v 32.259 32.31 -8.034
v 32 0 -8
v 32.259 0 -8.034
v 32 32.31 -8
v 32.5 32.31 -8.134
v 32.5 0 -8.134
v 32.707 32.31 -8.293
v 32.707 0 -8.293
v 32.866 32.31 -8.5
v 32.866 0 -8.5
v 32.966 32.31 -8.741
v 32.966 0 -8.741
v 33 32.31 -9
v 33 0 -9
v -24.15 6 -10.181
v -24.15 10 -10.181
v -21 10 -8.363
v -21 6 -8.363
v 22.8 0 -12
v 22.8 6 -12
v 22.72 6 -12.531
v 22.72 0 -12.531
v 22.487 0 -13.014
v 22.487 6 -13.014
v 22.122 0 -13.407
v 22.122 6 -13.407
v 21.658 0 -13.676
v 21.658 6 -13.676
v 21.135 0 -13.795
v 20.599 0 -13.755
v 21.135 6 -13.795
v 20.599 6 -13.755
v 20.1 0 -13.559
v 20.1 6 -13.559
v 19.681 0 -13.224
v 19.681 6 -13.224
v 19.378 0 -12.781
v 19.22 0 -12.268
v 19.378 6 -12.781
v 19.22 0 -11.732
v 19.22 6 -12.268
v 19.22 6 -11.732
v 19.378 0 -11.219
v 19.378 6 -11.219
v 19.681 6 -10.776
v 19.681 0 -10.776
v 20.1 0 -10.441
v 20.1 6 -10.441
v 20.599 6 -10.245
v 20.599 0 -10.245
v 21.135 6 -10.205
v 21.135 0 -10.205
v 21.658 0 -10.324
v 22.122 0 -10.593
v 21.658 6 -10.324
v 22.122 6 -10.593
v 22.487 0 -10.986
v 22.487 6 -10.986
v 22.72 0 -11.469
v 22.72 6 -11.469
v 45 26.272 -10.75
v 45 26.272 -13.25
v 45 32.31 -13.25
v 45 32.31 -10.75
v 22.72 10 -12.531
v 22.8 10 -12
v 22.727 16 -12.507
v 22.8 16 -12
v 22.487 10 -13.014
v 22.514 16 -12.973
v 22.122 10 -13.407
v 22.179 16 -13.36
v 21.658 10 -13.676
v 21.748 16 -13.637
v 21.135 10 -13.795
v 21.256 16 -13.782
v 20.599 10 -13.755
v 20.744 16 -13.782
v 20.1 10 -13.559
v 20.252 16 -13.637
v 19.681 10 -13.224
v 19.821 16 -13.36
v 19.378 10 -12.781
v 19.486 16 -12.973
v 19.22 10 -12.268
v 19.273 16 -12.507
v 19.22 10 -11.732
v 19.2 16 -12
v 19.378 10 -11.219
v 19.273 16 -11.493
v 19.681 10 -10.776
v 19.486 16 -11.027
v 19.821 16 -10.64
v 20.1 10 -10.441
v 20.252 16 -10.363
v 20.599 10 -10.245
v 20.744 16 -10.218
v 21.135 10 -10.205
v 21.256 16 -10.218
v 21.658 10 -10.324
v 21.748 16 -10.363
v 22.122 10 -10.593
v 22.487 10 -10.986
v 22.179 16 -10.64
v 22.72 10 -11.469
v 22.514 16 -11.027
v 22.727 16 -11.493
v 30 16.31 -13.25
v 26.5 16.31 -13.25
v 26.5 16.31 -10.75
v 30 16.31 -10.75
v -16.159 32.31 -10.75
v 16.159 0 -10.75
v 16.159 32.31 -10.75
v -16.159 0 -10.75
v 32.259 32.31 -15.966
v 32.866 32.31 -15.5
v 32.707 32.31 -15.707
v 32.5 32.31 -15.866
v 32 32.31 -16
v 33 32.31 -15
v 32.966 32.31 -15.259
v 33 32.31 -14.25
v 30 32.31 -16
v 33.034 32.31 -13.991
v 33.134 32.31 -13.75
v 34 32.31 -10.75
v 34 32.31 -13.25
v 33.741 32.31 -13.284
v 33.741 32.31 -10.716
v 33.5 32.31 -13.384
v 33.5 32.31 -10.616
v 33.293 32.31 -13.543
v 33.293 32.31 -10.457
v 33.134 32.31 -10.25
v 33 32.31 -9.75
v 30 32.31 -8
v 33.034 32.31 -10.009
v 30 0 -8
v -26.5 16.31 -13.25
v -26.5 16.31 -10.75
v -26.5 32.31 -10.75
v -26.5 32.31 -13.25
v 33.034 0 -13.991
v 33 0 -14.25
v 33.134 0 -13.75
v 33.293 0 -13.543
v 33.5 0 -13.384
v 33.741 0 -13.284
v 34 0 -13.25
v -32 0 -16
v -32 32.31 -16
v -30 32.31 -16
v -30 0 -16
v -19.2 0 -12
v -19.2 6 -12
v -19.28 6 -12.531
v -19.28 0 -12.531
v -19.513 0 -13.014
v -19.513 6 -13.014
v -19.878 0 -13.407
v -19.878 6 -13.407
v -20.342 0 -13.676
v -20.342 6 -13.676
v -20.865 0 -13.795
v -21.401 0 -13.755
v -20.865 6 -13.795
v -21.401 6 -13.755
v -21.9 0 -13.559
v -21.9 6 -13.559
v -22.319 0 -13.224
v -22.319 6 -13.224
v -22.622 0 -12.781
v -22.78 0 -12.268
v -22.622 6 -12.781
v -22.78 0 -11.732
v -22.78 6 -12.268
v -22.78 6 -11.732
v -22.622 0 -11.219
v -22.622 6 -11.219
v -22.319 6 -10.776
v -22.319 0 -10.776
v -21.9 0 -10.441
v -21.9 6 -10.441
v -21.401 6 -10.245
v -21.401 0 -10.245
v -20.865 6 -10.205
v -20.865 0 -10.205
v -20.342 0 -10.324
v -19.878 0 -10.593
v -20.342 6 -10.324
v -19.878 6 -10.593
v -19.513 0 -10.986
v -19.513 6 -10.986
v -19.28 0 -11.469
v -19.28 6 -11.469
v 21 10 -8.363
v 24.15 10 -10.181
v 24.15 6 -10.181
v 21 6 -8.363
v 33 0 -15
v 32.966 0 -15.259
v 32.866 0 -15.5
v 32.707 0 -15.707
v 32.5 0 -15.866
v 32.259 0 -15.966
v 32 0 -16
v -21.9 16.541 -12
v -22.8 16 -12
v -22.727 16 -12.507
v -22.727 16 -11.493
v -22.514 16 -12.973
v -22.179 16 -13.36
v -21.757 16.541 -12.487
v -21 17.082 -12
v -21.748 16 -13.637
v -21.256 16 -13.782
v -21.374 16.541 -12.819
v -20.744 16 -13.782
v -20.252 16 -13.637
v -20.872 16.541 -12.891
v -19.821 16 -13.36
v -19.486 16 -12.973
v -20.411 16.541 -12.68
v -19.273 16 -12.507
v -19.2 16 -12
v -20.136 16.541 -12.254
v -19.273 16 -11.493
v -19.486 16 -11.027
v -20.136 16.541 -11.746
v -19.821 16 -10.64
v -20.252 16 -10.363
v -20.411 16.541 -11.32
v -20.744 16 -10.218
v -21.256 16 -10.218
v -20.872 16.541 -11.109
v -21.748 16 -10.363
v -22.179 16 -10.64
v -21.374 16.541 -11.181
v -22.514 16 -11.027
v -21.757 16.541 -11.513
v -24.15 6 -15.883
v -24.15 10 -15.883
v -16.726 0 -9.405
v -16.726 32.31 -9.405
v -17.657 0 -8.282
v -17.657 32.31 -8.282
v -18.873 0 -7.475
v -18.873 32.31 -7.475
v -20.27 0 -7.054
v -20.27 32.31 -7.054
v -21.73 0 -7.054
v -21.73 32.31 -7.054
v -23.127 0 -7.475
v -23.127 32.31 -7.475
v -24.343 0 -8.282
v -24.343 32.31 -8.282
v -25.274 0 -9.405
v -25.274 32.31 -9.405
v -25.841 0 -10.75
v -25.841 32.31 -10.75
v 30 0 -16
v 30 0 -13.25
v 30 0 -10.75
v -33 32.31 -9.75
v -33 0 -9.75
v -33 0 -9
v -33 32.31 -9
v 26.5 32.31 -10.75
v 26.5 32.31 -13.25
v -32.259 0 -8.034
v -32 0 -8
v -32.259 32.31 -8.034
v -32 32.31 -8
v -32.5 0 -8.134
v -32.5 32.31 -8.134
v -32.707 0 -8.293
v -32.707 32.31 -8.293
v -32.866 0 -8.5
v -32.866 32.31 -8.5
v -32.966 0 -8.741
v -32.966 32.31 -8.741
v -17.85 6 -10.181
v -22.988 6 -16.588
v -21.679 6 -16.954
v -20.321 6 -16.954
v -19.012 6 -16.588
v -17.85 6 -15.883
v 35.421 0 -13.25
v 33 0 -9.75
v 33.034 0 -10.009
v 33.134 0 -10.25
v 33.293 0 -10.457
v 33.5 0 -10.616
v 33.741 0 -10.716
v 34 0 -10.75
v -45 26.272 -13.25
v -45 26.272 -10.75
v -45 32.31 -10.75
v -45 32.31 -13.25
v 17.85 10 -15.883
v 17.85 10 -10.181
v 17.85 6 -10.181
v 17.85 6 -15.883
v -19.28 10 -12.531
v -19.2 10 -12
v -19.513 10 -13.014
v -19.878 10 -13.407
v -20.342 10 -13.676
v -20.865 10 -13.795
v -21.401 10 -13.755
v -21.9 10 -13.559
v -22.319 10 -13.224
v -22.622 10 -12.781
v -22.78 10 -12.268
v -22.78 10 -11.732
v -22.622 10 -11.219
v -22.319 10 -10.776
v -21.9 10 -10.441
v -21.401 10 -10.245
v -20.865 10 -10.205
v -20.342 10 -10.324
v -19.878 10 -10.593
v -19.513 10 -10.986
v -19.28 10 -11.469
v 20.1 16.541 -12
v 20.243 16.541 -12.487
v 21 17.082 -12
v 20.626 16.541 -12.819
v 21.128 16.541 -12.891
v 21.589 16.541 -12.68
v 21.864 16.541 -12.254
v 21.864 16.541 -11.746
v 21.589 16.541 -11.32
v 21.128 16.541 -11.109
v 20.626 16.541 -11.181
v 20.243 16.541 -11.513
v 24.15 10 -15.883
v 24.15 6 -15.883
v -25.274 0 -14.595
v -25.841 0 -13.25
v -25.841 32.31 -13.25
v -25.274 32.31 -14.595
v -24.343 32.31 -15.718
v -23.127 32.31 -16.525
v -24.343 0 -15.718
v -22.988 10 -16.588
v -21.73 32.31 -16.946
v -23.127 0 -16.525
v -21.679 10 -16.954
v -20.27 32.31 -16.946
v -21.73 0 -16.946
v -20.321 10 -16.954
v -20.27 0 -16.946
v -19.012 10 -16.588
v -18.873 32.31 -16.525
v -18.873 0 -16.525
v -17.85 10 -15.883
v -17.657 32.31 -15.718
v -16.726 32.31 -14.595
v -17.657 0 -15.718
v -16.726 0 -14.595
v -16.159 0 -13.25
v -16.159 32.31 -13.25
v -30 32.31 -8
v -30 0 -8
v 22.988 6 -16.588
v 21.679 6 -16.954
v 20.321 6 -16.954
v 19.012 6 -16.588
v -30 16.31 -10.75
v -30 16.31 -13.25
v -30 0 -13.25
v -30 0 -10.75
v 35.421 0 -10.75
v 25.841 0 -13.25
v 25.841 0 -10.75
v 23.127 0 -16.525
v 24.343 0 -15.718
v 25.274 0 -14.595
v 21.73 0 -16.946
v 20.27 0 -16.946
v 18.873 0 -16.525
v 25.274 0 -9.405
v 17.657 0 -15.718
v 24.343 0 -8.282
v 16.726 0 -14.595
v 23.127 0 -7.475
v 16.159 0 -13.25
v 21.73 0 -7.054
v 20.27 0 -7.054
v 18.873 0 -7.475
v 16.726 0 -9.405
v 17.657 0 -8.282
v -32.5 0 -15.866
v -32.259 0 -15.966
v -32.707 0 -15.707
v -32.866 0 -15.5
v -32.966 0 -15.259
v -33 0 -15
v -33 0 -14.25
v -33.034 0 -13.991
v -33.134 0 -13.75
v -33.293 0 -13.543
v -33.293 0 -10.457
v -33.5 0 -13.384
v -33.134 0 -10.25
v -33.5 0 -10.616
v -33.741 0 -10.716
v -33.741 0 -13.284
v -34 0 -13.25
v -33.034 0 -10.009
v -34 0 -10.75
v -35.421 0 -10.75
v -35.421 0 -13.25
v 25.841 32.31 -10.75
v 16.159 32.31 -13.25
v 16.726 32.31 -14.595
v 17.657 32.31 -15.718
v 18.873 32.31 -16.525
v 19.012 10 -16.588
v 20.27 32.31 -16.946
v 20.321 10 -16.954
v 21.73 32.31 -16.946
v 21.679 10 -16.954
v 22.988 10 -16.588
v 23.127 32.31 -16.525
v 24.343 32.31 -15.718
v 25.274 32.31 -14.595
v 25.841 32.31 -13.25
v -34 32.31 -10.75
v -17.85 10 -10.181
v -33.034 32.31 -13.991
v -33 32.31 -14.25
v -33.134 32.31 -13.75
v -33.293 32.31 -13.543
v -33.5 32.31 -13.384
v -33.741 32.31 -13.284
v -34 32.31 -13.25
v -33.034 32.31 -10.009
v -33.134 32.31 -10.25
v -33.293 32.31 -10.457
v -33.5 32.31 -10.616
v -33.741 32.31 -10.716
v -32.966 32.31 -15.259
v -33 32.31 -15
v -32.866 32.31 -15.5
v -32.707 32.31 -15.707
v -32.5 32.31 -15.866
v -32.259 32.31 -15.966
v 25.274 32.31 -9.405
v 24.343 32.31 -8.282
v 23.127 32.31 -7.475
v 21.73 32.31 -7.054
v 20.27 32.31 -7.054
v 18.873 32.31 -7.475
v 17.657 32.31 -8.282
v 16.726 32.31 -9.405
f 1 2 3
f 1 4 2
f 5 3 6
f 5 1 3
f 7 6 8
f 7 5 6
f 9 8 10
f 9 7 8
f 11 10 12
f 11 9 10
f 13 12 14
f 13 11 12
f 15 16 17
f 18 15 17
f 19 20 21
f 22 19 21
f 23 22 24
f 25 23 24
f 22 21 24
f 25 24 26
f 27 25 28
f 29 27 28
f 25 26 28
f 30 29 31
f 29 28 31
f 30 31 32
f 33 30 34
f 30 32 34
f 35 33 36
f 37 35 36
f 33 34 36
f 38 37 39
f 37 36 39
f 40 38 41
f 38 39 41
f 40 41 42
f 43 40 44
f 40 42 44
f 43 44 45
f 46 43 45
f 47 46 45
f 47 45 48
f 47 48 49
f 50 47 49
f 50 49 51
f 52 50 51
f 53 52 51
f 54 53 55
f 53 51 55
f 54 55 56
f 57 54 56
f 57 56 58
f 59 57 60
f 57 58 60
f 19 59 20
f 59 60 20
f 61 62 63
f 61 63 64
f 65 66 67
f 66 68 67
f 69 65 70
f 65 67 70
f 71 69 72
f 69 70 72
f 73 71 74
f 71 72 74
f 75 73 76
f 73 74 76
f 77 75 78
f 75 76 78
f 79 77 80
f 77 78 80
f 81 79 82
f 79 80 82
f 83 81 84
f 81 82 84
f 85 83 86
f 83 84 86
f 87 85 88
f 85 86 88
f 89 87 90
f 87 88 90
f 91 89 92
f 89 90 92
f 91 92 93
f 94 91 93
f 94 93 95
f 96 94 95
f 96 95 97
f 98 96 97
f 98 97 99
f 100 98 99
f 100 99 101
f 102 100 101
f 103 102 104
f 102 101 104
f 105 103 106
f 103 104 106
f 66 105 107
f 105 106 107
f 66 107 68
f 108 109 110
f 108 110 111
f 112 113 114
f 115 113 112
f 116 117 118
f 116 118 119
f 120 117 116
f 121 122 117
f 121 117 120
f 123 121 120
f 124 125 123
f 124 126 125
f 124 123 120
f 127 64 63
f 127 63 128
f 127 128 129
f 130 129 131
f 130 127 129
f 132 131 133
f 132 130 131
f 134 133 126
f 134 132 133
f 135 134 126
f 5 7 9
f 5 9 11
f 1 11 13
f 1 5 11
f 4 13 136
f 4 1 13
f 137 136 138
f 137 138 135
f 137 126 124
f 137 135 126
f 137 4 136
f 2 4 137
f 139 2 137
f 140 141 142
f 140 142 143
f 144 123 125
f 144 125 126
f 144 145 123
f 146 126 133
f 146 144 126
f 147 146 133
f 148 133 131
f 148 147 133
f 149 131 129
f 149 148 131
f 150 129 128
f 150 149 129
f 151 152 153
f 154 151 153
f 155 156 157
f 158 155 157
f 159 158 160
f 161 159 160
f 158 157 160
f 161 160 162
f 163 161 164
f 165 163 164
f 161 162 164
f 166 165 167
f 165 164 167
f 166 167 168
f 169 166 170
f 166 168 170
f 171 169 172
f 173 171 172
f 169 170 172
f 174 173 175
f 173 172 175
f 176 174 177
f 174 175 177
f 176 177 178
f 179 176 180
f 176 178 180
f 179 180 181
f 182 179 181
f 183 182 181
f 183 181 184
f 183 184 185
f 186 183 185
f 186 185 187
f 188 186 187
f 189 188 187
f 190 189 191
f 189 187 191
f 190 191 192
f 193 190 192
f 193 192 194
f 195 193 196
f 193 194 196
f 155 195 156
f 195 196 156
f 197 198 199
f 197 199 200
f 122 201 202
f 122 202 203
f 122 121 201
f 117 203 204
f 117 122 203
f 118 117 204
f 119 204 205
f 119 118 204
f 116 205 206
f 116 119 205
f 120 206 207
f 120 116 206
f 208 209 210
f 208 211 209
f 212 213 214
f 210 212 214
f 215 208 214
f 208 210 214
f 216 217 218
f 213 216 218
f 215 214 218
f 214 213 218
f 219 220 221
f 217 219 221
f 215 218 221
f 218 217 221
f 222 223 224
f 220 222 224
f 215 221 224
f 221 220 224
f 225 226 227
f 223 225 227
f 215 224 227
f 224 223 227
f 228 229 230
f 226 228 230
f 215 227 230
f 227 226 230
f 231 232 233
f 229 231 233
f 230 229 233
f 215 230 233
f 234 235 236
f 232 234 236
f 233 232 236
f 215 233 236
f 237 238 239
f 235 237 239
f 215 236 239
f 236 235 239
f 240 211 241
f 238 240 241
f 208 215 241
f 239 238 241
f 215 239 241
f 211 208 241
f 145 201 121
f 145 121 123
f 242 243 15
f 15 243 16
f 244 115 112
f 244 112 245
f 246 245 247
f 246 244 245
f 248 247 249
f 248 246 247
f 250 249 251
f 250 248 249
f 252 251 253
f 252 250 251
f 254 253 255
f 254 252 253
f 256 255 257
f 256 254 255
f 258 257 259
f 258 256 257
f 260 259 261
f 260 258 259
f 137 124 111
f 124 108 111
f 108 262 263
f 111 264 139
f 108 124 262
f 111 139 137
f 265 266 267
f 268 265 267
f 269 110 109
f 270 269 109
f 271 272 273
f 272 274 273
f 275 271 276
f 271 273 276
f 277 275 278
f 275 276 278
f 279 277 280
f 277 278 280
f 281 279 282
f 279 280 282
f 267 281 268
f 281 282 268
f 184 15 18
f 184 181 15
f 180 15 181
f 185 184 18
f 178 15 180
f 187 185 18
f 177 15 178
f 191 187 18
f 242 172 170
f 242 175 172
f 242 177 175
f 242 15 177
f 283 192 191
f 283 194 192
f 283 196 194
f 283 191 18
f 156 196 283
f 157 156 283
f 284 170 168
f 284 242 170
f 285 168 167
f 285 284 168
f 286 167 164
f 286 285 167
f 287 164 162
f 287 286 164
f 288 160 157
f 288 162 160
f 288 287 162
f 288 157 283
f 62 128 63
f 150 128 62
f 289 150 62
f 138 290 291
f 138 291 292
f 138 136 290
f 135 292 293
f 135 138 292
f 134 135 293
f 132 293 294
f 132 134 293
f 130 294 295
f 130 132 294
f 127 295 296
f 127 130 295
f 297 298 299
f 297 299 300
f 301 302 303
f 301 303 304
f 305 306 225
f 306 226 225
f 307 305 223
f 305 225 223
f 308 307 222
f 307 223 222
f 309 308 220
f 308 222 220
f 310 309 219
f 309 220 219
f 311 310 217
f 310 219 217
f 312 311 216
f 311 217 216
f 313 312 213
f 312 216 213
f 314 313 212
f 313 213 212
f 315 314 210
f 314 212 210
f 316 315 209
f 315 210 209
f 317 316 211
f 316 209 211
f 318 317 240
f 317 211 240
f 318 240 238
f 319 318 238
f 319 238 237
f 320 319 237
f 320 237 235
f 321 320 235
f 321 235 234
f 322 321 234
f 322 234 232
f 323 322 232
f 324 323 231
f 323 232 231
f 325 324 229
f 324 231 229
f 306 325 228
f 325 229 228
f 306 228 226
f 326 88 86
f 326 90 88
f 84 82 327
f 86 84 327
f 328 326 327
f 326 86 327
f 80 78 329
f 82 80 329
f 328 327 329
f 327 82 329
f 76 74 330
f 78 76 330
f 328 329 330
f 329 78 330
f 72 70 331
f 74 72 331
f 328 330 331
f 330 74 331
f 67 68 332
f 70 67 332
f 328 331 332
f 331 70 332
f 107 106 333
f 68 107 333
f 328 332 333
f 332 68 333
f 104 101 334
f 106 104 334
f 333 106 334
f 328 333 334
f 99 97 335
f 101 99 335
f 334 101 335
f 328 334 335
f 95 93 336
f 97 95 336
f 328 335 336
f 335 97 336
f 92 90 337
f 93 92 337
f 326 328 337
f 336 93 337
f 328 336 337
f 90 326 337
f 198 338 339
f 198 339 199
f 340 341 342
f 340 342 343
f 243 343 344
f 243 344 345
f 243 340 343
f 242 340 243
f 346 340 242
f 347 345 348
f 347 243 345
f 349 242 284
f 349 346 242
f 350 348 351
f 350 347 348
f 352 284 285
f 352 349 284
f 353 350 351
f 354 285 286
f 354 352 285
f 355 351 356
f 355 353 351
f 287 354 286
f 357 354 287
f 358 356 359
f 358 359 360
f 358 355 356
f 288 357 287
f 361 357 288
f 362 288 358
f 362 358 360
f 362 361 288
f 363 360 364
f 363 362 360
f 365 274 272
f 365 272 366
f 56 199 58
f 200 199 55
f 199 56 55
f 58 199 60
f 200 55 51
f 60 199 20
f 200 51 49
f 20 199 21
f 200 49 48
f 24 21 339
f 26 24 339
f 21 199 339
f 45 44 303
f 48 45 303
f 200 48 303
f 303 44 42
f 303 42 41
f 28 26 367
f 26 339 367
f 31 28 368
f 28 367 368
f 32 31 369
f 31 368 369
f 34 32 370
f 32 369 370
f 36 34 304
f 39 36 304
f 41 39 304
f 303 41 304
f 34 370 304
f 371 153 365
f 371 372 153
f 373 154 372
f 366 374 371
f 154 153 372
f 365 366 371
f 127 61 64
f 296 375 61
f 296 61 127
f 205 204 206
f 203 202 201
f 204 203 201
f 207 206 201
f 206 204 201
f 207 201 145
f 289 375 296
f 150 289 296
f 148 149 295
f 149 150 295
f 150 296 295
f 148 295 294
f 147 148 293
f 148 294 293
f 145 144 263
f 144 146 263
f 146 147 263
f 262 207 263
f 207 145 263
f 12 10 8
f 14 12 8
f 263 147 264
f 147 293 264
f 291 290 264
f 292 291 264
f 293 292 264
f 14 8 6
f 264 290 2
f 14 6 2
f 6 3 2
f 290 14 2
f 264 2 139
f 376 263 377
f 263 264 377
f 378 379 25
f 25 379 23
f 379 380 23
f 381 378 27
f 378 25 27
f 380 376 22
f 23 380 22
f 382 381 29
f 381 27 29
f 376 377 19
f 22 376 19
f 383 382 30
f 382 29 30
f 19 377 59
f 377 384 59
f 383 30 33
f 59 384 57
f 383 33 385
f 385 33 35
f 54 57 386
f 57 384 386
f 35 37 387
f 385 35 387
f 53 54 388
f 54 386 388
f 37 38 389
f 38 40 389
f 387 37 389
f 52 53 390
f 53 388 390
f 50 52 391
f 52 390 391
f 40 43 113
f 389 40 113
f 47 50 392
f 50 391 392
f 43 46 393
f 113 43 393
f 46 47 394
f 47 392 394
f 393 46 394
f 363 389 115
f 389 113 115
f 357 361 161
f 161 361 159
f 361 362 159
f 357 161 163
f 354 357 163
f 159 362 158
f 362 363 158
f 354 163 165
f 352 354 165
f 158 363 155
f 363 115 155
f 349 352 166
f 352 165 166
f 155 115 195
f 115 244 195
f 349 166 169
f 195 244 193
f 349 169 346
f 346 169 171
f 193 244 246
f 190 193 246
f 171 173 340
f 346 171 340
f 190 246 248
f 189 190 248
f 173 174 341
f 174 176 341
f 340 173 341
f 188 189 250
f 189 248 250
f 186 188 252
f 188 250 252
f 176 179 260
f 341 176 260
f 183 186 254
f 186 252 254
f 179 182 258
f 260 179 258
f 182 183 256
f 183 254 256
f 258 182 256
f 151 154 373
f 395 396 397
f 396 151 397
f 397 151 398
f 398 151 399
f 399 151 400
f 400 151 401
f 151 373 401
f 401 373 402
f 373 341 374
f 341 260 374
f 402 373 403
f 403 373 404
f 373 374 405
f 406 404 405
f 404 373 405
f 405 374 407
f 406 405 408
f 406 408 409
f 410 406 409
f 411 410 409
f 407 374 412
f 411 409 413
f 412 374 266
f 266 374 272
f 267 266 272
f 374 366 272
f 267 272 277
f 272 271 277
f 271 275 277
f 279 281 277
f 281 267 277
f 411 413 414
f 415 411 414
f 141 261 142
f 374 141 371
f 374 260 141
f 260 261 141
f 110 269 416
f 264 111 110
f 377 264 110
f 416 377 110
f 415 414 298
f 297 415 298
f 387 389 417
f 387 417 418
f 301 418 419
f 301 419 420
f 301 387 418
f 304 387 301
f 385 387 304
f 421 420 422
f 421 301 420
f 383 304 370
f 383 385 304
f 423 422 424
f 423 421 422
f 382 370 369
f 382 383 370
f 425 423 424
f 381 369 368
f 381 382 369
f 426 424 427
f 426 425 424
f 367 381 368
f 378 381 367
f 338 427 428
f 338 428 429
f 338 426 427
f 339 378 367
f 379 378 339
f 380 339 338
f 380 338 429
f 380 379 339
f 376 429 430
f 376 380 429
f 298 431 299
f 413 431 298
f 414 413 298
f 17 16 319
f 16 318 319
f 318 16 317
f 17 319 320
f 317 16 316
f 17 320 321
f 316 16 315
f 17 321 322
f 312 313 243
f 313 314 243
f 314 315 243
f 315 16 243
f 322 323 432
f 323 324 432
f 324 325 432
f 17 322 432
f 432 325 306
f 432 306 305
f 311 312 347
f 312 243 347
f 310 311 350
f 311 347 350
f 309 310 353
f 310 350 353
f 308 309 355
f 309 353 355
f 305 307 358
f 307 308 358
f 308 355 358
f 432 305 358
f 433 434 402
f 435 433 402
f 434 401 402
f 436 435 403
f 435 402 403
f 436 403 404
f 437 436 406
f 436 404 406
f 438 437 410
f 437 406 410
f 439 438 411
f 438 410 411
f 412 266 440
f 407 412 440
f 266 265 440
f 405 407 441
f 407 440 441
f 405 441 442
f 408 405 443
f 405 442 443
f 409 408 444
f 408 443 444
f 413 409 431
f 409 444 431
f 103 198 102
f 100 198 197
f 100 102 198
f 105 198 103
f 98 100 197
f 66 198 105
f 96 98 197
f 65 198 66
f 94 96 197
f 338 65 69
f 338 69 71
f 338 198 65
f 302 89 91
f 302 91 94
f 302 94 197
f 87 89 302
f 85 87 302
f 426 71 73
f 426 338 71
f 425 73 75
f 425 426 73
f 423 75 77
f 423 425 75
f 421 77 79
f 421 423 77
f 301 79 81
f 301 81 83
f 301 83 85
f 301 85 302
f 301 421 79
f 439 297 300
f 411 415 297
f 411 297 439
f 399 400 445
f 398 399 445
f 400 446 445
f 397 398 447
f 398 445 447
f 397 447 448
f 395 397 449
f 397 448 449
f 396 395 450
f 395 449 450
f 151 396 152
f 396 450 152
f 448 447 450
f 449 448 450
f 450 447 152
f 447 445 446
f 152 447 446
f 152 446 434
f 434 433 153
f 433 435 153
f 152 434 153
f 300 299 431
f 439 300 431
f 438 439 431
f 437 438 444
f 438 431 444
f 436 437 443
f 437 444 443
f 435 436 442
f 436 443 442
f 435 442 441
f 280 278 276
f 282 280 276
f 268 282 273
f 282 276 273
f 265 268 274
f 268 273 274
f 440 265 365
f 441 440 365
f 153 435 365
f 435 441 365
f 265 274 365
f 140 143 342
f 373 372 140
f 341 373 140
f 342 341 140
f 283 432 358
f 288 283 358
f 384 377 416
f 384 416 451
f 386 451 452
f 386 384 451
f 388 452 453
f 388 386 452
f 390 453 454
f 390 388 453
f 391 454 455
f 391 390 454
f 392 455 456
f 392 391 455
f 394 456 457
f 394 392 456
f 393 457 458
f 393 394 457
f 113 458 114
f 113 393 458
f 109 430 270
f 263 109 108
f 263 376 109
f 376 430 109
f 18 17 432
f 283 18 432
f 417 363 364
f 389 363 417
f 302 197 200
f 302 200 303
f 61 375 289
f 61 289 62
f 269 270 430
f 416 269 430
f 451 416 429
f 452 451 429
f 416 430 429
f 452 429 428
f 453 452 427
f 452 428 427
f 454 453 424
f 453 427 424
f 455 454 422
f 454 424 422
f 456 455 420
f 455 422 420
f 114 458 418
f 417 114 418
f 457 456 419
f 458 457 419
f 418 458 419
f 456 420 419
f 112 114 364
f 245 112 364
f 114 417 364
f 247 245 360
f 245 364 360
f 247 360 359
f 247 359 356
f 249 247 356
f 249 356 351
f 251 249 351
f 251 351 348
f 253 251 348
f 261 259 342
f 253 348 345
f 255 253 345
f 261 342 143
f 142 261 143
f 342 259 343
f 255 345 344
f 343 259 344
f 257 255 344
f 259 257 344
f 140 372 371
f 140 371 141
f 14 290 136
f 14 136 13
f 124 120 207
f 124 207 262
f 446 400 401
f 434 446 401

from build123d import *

# Parameters (mm, degrees)
BOSS_EXTRUDE1_DEPTH      = 32.31
CUT_EXTRUDE1_DEPTH       = 25
SKETCH3_W                = 3.5
SKETCH3_H                = 16.162716407
CUT_EXTRUDE2_DEPTH       = 16
SKETCH4_W                = 3
SKETCH4_H                = 8
BOSS_EXTRUDE2_DEPTH      = 32.31
FILLET1_R                = 1
FILLET2_R                = 1
M3_CLEARANCE_HOLE1_D     = 3.6
M3_CLEARANCE_HOLE1_DEPTH = 16
M3_CLEARANCE_HOLE1_TIP   = 1.081549114
CUT_EXTRUDE3_DEPTH       = 4


with BuildPart() as part:
    # Sketch1 → Boss-Extrude1 (new body)
    with BuildSketch(Plane(origin=(0, 0, 0), x_dir=(1, 0, 0), z_dir=(0, 1, 0))):
        with BuildLine():
            Line((-45, 13.25), (-25.841229183, 13.25))
            ThreePointArc((-25.841229183, 13.25), (-21, 17), (-16.158770817, 13.25))
            Line((-16.158770817, 13.25), (16.158770817, 13.25))
            ThreePointArc((16.158770817, 13.25), (21, 17), (25.841229183, 13.25))
            Line((25.841229183, 13.25), (45, 13.25))
            Line((45, 13.25), (45, 10.75))
            Line((45, 10.75), (25.841229183, 10.75))
            ThreePointArc((25.841229183, 10.75), (21, 7), (16.158770817, 10.75))
            Line((16.158770817, 10.75), (-16.158770817, 10.75))
            ThreePointArc((-16.158770817, 10.75), (-21, 7), (-25.841229183, 10.75))
            Line((-25.841229183, 10.75), (-45, 10.75))
            Line((-45, 10.75), (-45, 13.25))
        make_face()
    extrude(amount=BOSS_EXTRUDE1_DEPTH)

    # Sketch2 → Cut-Extrude1 (cut)
    with BuildSketch(Plane.XY.offset(-10.75)):
        Polygon((-35.420614591, 0), (-45, 26.272359302), (-58.390365854, 22.525370437), (-53.81468831, -5.500654521), (-35.420614591, -4.763359631), align=None)
        Polygon((53.81468831, -5.500654521), (35.420614591, -4.763359631), (35.420614591, 0), (45, 26.272359302), (58.390365854, 22.525370437), align=None)
    extrude(amount=-CUT_EXTRUDE1_DEPTH, mode=Mode.SUBTRACT)

    # Sketch3 → Cut-Extrude2 (cut)
    with BuildSketch(Plane(origin=(0, 32.31, 0), x_dir=(1, 0, 0), z_dir=(0, 1, 0))):
        with Locations((-28.25, 12.031966157)):
            Rectangle(SKETCH3_W, SKETCH3_H)
        with Locations((28.25, 12.031966157)):
            Rectangle(SKETCH3_W, SKETCH3_H)
    extrude(amount=-CUT_EXTRUDE2_DEPTH, mode=Mode.SUBTRACT)

    # Sketch4 → Boss-Extrude2 (add)
    with BuildSketch(Plane.XZ):
        with Locations((-31.5, -12)):
            Rectangle(SKETCH4_W, SKETCH4_H)
    boss_extrude2 = extrude(amount=-BOSS_EXTRUDE2_DEPTH)

    # Fillet1
    fillet1_edges = [part.edges().sort_by_distance(p)[0] for p in [
        (-33, 16.155, -10.75),
        (-33, 16.155, -8),
        (-33, 16.155, -13.25),
        (-33, 16.155, -16),
    ]]
    fillet(fillet1_edges, radius=FILLET1_R)

    # Mirror1: Boss-Extrude2 across plane
    add(boss_extrude2.mirror(Plane(origin=(0, 0, 0), x_dir=(0, 0, 1), z_dir=(1, 0, 0))))

    # Fillet2
    fillet2_edges = [part.edges().sort_by_distance(p)[0] for p in [
        (33, 16.155, -10.75),
        (33, 16.155, -8),
        (33, 16.155, -13.25),
        (33, 16.155, -16),
    ]]
    fillet(fillet2_edges, radius=FILLET2_R)

    # M3 Clearance Hole1
    with Locations(Plane(origin=(0, 0, 0), x_dir=(-1, 0, 0), z_dir=(0, -1, 0))):
        with Locations((-21, 12), (21, 12)):
            Hole(M3_CLEARANCE_HOLE1_D / 2, depth=M3_CLEARANCE_HOLE1_DEPTH)
            with Locations((0, 0, -(M3_CLEARANCE_HOLE1_DEPTH + M3_CLEARANCE_HOLE1_TIP / 2))):  # 118° drill point
                Cone(0, M3_CLEARANCE_HOLE1_D / 2, M3_CLEARANCE_HOLE1_TIP, mode=Mode.SUBTRACT)

    # Sketch7 → Cut-Extrude3 (cut)
    with BuildSketch(Plane(origin=(0, 10, 0), x_dir=(-1, 0, 0), z_dir=(0, -1, 0))):
        Polygon((-24.15, 13.818653348), (-24.15, 10.181346652), (-21, 8.362693304), (-17.85, 10.181346652), (-17.85, 13.818653348), (-17.85, 20.157444089), (-24.15, 20.157444089), align=None)
    cut_extrude3 = extrude(amount=CUT_EXTRUDE3_DEPTH, mode=Mode.SUBTRACT)

    # Mirror2: Cut-Extrude3 across plane
    add(cut_extrude3.mirror(Plane(origin=(0, 0, 0), x_dir=(0, 0, 1), z_dir=(1, 0, 0))), mode=Mode.SUBTRACT)


solid = part.part
